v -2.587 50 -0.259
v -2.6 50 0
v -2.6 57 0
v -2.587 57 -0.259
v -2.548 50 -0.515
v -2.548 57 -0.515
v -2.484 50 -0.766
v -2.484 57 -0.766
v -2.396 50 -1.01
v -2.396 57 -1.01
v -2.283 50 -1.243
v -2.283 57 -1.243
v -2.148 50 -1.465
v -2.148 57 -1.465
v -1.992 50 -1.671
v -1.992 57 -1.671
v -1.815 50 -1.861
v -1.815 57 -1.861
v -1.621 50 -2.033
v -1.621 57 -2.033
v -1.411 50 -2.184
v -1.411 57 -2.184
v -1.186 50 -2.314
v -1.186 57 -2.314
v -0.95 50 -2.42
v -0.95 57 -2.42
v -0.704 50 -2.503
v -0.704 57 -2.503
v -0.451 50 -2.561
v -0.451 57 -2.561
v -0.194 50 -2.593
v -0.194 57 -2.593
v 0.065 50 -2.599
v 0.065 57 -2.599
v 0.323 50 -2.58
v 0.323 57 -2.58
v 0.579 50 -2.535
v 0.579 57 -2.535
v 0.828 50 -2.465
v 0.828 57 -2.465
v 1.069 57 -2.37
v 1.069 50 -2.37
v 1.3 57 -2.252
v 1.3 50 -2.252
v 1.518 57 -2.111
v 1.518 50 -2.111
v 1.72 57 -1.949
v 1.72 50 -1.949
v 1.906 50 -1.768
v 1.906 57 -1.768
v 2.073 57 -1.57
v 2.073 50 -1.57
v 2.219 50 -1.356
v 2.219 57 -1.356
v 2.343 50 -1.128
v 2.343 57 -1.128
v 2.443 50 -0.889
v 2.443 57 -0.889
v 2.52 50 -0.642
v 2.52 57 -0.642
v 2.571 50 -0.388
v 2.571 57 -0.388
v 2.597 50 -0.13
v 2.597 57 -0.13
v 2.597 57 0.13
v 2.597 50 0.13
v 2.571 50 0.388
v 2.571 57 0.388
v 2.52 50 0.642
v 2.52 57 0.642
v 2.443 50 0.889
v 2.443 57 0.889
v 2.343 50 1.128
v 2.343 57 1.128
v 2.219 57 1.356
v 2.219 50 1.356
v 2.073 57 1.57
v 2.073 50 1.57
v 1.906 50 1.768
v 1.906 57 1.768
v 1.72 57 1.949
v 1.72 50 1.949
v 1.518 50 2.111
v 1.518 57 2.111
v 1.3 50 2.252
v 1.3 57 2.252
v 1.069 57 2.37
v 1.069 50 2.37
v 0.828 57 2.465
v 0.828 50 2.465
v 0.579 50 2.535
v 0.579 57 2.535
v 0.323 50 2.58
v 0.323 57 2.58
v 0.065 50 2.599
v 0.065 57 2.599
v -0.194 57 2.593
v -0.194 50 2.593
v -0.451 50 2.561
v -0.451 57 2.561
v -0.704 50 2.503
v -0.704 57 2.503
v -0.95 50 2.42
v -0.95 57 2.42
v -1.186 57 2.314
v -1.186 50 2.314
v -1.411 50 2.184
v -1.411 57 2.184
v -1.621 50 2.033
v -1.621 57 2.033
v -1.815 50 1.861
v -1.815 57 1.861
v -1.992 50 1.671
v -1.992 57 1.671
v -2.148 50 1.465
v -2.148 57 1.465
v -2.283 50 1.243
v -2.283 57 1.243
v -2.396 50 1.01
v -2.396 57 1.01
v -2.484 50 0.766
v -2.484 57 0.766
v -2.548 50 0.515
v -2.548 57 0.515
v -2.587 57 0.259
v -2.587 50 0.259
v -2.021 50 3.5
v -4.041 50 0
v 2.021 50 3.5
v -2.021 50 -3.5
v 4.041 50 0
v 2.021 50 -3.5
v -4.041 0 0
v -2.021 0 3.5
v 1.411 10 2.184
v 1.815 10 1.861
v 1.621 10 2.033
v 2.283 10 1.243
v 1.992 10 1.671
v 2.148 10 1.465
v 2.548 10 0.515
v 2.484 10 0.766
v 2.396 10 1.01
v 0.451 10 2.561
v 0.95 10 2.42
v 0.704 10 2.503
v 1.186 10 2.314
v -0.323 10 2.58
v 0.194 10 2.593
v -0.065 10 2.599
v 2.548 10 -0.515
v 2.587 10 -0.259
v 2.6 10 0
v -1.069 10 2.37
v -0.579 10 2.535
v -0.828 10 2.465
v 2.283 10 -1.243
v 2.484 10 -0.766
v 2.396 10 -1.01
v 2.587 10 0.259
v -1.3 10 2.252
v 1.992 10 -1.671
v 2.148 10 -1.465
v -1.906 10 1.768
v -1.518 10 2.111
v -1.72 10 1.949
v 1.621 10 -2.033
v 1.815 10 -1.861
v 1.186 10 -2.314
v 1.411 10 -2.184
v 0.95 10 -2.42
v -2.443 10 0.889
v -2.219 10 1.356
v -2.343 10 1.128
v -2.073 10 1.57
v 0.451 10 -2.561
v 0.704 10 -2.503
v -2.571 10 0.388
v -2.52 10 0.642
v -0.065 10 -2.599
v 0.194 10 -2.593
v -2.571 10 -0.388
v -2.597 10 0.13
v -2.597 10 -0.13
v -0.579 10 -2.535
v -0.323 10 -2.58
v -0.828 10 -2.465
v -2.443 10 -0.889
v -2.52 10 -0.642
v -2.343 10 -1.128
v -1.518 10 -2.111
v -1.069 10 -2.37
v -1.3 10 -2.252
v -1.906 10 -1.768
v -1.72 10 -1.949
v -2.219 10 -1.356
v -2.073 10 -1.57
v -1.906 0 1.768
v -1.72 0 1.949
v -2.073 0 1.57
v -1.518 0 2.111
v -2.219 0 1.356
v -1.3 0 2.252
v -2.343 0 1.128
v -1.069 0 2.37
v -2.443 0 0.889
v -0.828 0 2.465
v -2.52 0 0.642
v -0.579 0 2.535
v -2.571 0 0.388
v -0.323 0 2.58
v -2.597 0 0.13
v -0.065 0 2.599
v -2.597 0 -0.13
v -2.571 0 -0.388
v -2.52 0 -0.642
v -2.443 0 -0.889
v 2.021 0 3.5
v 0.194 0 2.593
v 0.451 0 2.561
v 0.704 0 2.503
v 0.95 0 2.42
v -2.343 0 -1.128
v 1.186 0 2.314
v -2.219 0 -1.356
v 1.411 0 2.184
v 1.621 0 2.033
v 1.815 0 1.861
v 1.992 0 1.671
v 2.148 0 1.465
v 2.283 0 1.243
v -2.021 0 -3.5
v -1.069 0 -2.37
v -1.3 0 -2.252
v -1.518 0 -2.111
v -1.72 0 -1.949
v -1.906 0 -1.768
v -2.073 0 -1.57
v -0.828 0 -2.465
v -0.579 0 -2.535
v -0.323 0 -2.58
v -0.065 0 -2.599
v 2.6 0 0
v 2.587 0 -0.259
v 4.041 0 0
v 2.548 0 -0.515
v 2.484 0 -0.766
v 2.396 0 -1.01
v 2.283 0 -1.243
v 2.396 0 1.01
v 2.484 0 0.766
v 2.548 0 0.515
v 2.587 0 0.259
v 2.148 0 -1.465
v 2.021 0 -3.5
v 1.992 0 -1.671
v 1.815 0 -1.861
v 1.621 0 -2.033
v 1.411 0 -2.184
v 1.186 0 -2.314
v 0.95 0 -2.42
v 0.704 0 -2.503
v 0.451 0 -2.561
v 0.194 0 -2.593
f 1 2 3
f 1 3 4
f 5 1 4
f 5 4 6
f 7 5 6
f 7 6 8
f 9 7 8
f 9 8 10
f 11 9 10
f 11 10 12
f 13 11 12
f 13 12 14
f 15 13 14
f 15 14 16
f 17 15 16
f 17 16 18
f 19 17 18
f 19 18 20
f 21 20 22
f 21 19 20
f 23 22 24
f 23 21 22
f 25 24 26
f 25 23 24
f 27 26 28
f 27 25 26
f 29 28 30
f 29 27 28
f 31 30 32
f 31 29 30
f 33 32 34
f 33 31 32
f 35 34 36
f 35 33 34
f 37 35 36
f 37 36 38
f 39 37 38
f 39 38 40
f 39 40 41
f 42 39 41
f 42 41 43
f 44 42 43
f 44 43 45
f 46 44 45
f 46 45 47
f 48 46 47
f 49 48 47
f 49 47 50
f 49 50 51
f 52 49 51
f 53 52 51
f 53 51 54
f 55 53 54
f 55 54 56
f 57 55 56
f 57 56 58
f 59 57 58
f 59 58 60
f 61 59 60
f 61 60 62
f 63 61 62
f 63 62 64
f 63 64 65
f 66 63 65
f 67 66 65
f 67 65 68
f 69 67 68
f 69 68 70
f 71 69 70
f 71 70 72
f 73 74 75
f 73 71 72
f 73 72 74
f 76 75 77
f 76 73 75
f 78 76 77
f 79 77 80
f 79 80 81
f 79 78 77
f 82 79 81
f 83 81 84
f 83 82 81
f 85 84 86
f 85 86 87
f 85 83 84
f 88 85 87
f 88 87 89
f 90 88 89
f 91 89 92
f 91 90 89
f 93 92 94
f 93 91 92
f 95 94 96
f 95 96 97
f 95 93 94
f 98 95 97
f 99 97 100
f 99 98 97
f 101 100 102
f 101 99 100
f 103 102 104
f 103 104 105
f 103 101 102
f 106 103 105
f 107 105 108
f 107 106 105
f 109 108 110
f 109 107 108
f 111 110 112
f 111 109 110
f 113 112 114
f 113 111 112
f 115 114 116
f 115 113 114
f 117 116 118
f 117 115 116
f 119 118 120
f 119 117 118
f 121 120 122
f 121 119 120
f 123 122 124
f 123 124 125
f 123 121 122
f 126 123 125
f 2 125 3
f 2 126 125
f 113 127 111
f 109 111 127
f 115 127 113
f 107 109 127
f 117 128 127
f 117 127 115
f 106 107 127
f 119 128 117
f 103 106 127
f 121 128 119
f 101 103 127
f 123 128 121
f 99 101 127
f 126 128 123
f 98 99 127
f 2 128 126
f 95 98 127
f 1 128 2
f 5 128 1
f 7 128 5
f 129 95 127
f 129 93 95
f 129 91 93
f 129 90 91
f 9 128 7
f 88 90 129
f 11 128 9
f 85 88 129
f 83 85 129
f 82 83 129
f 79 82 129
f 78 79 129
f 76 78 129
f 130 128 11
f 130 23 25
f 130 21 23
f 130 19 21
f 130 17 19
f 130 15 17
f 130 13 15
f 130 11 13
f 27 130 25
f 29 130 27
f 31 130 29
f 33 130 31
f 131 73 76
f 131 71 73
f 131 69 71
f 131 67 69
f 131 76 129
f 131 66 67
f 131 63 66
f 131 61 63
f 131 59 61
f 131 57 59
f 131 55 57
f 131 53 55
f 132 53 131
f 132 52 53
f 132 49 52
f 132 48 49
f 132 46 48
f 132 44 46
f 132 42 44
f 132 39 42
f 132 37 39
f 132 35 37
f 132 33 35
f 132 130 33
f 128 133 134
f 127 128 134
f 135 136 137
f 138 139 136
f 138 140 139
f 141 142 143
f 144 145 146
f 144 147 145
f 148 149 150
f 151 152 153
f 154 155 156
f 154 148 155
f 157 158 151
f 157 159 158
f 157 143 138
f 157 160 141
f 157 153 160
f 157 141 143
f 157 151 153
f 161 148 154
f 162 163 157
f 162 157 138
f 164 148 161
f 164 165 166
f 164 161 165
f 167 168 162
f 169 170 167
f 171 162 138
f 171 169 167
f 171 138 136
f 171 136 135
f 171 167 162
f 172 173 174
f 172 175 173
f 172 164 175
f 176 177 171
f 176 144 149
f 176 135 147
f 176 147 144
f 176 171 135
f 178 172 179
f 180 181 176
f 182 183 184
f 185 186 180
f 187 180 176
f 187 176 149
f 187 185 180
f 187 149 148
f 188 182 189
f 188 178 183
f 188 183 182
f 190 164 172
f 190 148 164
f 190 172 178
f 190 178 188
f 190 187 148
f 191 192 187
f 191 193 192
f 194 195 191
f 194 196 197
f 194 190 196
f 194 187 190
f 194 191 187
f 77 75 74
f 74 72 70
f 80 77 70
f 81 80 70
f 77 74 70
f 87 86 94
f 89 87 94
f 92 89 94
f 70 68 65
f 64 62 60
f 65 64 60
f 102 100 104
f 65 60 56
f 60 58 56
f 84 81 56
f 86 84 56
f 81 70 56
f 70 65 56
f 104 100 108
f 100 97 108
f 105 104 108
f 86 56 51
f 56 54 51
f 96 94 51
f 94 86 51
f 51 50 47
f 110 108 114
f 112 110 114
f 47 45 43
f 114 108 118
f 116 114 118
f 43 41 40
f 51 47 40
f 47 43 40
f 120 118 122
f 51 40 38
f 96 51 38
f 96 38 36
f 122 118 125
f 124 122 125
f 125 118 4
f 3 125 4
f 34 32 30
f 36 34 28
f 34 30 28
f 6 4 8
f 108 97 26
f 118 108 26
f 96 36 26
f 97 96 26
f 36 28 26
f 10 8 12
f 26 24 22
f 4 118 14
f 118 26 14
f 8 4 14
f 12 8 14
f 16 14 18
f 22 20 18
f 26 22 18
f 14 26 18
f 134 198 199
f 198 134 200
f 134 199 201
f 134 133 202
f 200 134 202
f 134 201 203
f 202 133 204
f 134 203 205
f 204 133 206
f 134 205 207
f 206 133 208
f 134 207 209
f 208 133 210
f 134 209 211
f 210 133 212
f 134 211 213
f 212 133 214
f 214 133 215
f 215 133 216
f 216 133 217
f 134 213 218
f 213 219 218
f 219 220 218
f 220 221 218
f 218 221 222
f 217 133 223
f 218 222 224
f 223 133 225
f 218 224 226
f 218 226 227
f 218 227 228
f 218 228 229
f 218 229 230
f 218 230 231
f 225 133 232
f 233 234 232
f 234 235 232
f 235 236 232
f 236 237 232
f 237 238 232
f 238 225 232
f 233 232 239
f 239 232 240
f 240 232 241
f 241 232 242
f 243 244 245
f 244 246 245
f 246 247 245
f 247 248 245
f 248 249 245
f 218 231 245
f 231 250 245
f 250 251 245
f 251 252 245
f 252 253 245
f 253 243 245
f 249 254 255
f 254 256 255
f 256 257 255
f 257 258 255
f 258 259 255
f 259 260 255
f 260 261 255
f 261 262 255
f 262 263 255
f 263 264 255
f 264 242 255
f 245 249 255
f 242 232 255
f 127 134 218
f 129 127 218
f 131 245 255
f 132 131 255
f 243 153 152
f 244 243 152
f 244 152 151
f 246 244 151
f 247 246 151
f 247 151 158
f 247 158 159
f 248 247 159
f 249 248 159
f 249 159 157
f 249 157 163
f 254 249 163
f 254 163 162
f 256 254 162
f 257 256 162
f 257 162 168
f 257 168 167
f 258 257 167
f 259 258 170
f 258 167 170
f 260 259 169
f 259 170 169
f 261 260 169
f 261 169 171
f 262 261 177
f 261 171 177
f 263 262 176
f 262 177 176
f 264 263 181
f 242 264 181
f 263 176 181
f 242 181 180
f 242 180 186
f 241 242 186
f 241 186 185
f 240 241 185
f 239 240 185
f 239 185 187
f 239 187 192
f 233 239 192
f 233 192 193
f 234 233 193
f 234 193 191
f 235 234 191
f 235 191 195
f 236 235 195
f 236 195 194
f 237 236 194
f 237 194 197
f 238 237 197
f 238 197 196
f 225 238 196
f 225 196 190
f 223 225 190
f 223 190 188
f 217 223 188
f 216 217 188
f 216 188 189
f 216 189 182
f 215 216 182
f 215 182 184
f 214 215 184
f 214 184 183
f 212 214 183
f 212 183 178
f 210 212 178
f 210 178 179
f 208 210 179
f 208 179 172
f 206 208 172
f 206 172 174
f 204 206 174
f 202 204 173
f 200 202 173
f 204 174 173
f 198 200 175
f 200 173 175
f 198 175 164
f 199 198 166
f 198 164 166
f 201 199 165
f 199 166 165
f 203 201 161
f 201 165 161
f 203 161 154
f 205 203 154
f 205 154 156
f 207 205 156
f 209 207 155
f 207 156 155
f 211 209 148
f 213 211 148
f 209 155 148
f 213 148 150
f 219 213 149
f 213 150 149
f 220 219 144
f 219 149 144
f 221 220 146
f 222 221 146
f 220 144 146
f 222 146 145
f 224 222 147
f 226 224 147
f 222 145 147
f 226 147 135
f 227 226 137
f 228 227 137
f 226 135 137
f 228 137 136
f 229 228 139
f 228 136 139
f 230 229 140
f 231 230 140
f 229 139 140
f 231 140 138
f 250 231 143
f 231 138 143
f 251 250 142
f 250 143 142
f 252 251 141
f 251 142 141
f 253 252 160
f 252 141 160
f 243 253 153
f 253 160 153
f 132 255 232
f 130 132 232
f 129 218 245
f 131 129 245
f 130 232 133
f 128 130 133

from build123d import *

# Parameters (mm, degrees)
EXTRUDE_1_DEPTH     = 50
SKETCH_2_R          = 2.6
CUT_EXTRUDE_1_DEPTH = 51
SKETCH_3_R          = 2.6
EXTRUDE_2_DEPTH     = 47


with BuildPart() as part:
    # 草图1 → 凸台-拉伸1 (new body)
    with BuildSketch(Plane(origin=(0, 0, 0), x_dir=(1, 0, 0), z_dir=(0, 1, 0))):
        Polygon((4.041451884, 0), (2.020725942, 3.5), (-2.020725942, 3.5), (-4.041451884, 0), (-2.020725942, -3.5), (2.020725942, -3.5), align=None)
    extrude(amount=EXTRUDE_1_DEPTH)

    # 草图2 → 切除-拉伸1 (cut, through all)
    with BuildSketch(Plane(origin=(0, 50, 0), x_dir=(1, 0, 0), z_dir=(0, 1, 0))):
        Circle(SKETCH_2_R)
    extrude(amount=-CUT_EXTRUDE_1_DEPTH, mode=Mode.SUBTRACT)

    # 草图3 → 凸台-拉伸2 (add)
    with BuildSketch(Plane(origin=(0, 10, 0), x_dir=(-1, 0, 0), z_dir=(0, -1, 0))):
        Circle(SKETCH_3_R)
    extrude(amount=-EXTRUDE_2_DEPTH)


solid = part.part
